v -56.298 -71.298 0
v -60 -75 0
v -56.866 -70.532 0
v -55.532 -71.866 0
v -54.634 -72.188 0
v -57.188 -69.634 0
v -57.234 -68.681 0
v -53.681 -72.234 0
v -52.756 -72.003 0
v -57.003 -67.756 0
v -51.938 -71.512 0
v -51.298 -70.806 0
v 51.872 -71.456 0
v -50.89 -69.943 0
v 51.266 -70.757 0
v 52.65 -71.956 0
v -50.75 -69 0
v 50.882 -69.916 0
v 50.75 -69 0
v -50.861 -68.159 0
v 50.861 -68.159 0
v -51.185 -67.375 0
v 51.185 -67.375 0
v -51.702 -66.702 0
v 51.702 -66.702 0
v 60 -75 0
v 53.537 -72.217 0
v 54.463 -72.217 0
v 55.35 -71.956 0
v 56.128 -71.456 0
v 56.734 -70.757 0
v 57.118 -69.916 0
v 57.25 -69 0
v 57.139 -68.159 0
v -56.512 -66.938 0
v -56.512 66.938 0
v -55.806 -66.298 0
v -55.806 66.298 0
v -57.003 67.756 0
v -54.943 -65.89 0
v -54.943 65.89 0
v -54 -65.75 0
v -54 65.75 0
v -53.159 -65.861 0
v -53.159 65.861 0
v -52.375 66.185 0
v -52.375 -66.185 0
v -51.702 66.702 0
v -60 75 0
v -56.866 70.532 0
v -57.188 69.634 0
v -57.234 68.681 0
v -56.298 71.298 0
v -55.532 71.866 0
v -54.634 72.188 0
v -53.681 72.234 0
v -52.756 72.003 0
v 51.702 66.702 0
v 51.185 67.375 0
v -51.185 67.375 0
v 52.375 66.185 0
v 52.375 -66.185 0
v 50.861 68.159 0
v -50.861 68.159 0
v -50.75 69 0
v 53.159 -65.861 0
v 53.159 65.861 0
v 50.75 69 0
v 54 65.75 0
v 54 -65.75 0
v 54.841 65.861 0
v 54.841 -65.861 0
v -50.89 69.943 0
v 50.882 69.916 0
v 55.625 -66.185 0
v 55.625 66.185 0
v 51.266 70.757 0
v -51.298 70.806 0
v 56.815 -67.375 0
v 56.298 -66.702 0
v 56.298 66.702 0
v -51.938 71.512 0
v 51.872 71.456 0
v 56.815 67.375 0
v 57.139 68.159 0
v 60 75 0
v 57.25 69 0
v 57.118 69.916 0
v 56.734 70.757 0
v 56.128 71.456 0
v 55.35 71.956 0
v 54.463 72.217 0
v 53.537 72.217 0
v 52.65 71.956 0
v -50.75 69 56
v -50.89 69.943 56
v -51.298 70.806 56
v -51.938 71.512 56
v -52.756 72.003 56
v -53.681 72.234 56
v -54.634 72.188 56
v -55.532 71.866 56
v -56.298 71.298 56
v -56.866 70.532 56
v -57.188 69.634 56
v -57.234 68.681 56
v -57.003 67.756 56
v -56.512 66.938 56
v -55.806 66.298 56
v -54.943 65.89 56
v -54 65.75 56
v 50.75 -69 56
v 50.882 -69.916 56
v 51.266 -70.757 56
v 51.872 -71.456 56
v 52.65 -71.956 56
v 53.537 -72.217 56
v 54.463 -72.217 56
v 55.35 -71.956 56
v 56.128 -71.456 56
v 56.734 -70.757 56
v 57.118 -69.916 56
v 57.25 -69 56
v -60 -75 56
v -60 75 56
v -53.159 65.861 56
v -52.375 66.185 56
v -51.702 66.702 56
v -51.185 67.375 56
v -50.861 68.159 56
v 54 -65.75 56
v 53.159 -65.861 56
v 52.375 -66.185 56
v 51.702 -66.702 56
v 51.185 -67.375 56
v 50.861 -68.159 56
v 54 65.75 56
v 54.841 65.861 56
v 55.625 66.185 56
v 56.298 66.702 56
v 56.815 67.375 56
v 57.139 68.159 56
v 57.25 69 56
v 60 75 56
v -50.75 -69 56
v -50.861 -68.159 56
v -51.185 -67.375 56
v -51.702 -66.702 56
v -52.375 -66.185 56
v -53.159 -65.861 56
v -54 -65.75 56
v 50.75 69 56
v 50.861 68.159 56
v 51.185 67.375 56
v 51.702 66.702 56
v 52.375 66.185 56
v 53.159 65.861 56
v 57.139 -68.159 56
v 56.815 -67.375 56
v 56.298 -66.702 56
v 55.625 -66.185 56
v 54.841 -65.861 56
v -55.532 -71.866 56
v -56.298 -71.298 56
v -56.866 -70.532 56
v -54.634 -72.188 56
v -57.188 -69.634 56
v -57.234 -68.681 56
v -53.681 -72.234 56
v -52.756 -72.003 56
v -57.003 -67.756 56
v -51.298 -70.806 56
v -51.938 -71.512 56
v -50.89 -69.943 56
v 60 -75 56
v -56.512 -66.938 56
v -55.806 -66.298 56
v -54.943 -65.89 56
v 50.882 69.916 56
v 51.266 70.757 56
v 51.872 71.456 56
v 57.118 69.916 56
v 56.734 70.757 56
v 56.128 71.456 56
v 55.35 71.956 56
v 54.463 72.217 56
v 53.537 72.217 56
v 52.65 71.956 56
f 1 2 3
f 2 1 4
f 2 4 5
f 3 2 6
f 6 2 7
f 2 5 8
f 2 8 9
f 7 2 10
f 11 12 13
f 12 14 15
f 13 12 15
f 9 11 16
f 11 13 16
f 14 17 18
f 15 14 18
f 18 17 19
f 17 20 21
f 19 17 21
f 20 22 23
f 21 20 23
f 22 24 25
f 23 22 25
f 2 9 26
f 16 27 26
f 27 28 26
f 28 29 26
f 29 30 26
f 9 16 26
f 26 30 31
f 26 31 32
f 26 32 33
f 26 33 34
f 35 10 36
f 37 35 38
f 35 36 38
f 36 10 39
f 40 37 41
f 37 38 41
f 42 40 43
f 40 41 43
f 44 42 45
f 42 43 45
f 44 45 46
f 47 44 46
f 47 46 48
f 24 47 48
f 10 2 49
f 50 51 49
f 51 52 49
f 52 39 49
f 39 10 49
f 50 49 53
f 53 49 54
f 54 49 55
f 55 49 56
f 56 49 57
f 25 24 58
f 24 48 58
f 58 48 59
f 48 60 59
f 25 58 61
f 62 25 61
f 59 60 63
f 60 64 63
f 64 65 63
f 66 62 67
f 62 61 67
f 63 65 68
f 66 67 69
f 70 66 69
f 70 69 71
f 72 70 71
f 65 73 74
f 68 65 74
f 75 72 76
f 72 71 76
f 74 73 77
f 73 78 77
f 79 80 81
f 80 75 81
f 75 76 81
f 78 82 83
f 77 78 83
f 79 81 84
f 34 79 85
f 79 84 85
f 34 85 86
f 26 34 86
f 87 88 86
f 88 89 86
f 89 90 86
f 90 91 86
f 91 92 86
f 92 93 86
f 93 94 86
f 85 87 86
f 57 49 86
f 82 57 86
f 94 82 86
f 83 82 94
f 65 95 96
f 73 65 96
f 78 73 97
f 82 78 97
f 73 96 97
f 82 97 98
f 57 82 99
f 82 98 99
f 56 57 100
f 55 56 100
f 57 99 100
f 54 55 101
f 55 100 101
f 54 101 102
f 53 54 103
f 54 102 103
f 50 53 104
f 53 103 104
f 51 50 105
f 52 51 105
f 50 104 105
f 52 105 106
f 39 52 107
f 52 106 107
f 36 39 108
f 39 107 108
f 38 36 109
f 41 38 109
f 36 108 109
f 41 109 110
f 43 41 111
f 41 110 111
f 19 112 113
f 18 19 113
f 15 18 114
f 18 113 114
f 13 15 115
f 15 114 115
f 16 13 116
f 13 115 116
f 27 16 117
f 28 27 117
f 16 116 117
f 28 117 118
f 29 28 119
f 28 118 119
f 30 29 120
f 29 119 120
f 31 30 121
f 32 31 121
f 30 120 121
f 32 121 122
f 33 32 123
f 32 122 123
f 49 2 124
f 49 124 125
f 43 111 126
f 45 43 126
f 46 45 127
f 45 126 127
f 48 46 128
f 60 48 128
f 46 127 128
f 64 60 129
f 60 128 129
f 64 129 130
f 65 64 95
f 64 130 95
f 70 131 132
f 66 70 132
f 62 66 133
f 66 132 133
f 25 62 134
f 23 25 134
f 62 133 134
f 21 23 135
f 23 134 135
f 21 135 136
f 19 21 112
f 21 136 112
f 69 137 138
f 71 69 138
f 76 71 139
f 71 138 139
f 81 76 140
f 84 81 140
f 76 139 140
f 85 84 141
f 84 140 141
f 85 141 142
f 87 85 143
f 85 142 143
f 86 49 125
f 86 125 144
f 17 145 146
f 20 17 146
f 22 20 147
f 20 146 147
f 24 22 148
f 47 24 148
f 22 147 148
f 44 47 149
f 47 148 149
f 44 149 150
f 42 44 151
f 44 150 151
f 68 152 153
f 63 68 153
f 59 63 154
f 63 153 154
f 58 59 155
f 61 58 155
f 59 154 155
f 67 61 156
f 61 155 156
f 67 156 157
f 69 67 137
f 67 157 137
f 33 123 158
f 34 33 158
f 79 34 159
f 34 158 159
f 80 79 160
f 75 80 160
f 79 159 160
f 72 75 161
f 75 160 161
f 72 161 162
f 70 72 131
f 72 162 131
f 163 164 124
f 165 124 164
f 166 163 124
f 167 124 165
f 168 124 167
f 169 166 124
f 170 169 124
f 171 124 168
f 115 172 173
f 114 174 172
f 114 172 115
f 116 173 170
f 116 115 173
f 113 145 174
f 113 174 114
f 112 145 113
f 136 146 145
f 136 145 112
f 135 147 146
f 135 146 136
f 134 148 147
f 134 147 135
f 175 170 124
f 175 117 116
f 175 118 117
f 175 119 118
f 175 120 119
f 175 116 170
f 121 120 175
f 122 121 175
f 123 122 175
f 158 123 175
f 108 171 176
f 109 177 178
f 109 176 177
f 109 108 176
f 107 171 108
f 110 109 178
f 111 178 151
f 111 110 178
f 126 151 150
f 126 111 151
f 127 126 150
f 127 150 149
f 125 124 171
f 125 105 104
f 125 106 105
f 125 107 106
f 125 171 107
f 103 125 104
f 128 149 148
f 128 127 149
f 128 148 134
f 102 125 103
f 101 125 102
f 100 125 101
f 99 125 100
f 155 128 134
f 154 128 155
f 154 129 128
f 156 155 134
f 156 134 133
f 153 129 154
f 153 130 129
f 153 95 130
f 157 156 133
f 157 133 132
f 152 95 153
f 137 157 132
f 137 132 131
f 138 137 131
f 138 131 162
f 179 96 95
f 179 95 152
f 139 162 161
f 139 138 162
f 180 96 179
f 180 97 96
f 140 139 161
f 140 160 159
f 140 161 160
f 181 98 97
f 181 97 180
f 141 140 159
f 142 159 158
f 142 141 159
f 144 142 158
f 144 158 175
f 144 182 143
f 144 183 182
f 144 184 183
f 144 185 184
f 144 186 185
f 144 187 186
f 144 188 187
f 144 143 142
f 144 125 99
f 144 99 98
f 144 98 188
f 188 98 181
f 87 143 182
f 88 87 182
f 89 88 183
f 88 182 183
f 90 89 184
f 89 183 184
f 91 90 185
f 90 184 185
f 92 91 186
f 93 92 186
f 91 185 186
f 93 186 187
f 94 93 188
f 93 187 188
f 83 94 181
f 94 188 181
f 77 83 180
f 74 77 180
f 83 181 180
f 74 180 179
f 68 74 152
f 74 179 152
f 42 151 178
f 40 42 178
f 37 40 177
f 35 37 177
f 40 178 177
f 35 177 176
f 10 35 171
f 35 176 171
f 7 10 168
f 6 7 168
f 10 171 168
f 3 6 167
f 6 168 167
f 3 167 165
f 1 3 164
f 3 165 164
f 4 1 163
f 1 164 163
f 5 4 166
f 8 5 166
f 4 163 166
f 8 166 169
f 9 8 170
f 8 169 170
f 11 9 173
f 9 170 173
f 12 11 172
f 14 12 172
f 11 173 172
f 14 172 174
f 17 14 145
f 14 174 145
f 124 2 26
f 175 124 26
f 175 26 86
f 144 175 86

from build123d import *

# Parameters (mm, degrees)
F0_W     = 120
F0_H     = 150
F1_DEPTH = 56
F3_DEPTH = 67.5


with BuildPart() as f1:
    # F0 (on Top) → F1 (new body)
    with BuildSketch(Plane.XY):
        Rectangle(F0_W, F0_H)
    extrude(amount=F1_DEPTH)

    # F2 (on face) → F3 (cut)
    with BuildSketch(Plane.XY.offset(56)):
        with BuildLine():
            Line((-54, 65.75), (-54, 69))
            Line((-54, 69), (-50.75, 69))
            ThreePointArc((-50.75, 69), (-56.298097, 71.298097), (-54, 65.75))
        make_face()
        with BuildLine():
            Line((-50.75, 69), (-54, 69))
            Line((-54, 69), (-54, 65.75))
            ThreePointArc((-54, 65.75), (-51.701903, 66.701903), (-50.75, 69))
        make_face()
        with BuildLine():
            ThreePointArc((57.25, 69), (54, 72.25), (50.75, 69))
            Line((50.75, 69), (54, 69))
            Line((54, 69), (54, 65.75))
            ThreePointArc((54, 65.75), (56.298097, 66.701903), (57.25, 69))
        make_face()
        with BuildLine():
            Line((54, 69), (50.75, 69))
            ThreePointArc((50.75, 69), (51.701903, 66.701903), (54, 65.75))
            Line((54, 65.75), (54, 69))
        make_face()
        with BuildLine():
            Line((-54, -69), (-54, -65.75))
            ThreePointArc((-54, -65.75), (-56.298097, -71.298097), (-50.75, -69))
            Line((-50.75, -69), (-54, -69))
        make_face()
        with BuildLine():
            ThreePointArc((-50.75, -69), (-51.701903, -66.701903), (-54, -65.75))
            Line((-54, -65.75), (-54, -69))
            Line((-54, -69), (-50.75, -69))
        make_face()
        with BuildLine():
            ThreePointArc((57.25, -69), (56.298097, -66.701903), (54, -65.75))
            Line((54, -65.75), (54, -69))
            Line((54, -69), (50.75, -69))
            ThreePointArc((50.75, -69), (54, -72.25), (57.25, -69))
        make_face()
        with BuildLine():
            Line((54, -69), (54, -65.75))
            ThreePointArc((54, -65.75), (51.701903, -66.701903), (50.75, -69))
            Line((50.75, -69), (54, -69))
        make_face()
    extrude(amount=-F3_DEPTH, mode=Mode.SUBTRACT)


solid = f1.part
